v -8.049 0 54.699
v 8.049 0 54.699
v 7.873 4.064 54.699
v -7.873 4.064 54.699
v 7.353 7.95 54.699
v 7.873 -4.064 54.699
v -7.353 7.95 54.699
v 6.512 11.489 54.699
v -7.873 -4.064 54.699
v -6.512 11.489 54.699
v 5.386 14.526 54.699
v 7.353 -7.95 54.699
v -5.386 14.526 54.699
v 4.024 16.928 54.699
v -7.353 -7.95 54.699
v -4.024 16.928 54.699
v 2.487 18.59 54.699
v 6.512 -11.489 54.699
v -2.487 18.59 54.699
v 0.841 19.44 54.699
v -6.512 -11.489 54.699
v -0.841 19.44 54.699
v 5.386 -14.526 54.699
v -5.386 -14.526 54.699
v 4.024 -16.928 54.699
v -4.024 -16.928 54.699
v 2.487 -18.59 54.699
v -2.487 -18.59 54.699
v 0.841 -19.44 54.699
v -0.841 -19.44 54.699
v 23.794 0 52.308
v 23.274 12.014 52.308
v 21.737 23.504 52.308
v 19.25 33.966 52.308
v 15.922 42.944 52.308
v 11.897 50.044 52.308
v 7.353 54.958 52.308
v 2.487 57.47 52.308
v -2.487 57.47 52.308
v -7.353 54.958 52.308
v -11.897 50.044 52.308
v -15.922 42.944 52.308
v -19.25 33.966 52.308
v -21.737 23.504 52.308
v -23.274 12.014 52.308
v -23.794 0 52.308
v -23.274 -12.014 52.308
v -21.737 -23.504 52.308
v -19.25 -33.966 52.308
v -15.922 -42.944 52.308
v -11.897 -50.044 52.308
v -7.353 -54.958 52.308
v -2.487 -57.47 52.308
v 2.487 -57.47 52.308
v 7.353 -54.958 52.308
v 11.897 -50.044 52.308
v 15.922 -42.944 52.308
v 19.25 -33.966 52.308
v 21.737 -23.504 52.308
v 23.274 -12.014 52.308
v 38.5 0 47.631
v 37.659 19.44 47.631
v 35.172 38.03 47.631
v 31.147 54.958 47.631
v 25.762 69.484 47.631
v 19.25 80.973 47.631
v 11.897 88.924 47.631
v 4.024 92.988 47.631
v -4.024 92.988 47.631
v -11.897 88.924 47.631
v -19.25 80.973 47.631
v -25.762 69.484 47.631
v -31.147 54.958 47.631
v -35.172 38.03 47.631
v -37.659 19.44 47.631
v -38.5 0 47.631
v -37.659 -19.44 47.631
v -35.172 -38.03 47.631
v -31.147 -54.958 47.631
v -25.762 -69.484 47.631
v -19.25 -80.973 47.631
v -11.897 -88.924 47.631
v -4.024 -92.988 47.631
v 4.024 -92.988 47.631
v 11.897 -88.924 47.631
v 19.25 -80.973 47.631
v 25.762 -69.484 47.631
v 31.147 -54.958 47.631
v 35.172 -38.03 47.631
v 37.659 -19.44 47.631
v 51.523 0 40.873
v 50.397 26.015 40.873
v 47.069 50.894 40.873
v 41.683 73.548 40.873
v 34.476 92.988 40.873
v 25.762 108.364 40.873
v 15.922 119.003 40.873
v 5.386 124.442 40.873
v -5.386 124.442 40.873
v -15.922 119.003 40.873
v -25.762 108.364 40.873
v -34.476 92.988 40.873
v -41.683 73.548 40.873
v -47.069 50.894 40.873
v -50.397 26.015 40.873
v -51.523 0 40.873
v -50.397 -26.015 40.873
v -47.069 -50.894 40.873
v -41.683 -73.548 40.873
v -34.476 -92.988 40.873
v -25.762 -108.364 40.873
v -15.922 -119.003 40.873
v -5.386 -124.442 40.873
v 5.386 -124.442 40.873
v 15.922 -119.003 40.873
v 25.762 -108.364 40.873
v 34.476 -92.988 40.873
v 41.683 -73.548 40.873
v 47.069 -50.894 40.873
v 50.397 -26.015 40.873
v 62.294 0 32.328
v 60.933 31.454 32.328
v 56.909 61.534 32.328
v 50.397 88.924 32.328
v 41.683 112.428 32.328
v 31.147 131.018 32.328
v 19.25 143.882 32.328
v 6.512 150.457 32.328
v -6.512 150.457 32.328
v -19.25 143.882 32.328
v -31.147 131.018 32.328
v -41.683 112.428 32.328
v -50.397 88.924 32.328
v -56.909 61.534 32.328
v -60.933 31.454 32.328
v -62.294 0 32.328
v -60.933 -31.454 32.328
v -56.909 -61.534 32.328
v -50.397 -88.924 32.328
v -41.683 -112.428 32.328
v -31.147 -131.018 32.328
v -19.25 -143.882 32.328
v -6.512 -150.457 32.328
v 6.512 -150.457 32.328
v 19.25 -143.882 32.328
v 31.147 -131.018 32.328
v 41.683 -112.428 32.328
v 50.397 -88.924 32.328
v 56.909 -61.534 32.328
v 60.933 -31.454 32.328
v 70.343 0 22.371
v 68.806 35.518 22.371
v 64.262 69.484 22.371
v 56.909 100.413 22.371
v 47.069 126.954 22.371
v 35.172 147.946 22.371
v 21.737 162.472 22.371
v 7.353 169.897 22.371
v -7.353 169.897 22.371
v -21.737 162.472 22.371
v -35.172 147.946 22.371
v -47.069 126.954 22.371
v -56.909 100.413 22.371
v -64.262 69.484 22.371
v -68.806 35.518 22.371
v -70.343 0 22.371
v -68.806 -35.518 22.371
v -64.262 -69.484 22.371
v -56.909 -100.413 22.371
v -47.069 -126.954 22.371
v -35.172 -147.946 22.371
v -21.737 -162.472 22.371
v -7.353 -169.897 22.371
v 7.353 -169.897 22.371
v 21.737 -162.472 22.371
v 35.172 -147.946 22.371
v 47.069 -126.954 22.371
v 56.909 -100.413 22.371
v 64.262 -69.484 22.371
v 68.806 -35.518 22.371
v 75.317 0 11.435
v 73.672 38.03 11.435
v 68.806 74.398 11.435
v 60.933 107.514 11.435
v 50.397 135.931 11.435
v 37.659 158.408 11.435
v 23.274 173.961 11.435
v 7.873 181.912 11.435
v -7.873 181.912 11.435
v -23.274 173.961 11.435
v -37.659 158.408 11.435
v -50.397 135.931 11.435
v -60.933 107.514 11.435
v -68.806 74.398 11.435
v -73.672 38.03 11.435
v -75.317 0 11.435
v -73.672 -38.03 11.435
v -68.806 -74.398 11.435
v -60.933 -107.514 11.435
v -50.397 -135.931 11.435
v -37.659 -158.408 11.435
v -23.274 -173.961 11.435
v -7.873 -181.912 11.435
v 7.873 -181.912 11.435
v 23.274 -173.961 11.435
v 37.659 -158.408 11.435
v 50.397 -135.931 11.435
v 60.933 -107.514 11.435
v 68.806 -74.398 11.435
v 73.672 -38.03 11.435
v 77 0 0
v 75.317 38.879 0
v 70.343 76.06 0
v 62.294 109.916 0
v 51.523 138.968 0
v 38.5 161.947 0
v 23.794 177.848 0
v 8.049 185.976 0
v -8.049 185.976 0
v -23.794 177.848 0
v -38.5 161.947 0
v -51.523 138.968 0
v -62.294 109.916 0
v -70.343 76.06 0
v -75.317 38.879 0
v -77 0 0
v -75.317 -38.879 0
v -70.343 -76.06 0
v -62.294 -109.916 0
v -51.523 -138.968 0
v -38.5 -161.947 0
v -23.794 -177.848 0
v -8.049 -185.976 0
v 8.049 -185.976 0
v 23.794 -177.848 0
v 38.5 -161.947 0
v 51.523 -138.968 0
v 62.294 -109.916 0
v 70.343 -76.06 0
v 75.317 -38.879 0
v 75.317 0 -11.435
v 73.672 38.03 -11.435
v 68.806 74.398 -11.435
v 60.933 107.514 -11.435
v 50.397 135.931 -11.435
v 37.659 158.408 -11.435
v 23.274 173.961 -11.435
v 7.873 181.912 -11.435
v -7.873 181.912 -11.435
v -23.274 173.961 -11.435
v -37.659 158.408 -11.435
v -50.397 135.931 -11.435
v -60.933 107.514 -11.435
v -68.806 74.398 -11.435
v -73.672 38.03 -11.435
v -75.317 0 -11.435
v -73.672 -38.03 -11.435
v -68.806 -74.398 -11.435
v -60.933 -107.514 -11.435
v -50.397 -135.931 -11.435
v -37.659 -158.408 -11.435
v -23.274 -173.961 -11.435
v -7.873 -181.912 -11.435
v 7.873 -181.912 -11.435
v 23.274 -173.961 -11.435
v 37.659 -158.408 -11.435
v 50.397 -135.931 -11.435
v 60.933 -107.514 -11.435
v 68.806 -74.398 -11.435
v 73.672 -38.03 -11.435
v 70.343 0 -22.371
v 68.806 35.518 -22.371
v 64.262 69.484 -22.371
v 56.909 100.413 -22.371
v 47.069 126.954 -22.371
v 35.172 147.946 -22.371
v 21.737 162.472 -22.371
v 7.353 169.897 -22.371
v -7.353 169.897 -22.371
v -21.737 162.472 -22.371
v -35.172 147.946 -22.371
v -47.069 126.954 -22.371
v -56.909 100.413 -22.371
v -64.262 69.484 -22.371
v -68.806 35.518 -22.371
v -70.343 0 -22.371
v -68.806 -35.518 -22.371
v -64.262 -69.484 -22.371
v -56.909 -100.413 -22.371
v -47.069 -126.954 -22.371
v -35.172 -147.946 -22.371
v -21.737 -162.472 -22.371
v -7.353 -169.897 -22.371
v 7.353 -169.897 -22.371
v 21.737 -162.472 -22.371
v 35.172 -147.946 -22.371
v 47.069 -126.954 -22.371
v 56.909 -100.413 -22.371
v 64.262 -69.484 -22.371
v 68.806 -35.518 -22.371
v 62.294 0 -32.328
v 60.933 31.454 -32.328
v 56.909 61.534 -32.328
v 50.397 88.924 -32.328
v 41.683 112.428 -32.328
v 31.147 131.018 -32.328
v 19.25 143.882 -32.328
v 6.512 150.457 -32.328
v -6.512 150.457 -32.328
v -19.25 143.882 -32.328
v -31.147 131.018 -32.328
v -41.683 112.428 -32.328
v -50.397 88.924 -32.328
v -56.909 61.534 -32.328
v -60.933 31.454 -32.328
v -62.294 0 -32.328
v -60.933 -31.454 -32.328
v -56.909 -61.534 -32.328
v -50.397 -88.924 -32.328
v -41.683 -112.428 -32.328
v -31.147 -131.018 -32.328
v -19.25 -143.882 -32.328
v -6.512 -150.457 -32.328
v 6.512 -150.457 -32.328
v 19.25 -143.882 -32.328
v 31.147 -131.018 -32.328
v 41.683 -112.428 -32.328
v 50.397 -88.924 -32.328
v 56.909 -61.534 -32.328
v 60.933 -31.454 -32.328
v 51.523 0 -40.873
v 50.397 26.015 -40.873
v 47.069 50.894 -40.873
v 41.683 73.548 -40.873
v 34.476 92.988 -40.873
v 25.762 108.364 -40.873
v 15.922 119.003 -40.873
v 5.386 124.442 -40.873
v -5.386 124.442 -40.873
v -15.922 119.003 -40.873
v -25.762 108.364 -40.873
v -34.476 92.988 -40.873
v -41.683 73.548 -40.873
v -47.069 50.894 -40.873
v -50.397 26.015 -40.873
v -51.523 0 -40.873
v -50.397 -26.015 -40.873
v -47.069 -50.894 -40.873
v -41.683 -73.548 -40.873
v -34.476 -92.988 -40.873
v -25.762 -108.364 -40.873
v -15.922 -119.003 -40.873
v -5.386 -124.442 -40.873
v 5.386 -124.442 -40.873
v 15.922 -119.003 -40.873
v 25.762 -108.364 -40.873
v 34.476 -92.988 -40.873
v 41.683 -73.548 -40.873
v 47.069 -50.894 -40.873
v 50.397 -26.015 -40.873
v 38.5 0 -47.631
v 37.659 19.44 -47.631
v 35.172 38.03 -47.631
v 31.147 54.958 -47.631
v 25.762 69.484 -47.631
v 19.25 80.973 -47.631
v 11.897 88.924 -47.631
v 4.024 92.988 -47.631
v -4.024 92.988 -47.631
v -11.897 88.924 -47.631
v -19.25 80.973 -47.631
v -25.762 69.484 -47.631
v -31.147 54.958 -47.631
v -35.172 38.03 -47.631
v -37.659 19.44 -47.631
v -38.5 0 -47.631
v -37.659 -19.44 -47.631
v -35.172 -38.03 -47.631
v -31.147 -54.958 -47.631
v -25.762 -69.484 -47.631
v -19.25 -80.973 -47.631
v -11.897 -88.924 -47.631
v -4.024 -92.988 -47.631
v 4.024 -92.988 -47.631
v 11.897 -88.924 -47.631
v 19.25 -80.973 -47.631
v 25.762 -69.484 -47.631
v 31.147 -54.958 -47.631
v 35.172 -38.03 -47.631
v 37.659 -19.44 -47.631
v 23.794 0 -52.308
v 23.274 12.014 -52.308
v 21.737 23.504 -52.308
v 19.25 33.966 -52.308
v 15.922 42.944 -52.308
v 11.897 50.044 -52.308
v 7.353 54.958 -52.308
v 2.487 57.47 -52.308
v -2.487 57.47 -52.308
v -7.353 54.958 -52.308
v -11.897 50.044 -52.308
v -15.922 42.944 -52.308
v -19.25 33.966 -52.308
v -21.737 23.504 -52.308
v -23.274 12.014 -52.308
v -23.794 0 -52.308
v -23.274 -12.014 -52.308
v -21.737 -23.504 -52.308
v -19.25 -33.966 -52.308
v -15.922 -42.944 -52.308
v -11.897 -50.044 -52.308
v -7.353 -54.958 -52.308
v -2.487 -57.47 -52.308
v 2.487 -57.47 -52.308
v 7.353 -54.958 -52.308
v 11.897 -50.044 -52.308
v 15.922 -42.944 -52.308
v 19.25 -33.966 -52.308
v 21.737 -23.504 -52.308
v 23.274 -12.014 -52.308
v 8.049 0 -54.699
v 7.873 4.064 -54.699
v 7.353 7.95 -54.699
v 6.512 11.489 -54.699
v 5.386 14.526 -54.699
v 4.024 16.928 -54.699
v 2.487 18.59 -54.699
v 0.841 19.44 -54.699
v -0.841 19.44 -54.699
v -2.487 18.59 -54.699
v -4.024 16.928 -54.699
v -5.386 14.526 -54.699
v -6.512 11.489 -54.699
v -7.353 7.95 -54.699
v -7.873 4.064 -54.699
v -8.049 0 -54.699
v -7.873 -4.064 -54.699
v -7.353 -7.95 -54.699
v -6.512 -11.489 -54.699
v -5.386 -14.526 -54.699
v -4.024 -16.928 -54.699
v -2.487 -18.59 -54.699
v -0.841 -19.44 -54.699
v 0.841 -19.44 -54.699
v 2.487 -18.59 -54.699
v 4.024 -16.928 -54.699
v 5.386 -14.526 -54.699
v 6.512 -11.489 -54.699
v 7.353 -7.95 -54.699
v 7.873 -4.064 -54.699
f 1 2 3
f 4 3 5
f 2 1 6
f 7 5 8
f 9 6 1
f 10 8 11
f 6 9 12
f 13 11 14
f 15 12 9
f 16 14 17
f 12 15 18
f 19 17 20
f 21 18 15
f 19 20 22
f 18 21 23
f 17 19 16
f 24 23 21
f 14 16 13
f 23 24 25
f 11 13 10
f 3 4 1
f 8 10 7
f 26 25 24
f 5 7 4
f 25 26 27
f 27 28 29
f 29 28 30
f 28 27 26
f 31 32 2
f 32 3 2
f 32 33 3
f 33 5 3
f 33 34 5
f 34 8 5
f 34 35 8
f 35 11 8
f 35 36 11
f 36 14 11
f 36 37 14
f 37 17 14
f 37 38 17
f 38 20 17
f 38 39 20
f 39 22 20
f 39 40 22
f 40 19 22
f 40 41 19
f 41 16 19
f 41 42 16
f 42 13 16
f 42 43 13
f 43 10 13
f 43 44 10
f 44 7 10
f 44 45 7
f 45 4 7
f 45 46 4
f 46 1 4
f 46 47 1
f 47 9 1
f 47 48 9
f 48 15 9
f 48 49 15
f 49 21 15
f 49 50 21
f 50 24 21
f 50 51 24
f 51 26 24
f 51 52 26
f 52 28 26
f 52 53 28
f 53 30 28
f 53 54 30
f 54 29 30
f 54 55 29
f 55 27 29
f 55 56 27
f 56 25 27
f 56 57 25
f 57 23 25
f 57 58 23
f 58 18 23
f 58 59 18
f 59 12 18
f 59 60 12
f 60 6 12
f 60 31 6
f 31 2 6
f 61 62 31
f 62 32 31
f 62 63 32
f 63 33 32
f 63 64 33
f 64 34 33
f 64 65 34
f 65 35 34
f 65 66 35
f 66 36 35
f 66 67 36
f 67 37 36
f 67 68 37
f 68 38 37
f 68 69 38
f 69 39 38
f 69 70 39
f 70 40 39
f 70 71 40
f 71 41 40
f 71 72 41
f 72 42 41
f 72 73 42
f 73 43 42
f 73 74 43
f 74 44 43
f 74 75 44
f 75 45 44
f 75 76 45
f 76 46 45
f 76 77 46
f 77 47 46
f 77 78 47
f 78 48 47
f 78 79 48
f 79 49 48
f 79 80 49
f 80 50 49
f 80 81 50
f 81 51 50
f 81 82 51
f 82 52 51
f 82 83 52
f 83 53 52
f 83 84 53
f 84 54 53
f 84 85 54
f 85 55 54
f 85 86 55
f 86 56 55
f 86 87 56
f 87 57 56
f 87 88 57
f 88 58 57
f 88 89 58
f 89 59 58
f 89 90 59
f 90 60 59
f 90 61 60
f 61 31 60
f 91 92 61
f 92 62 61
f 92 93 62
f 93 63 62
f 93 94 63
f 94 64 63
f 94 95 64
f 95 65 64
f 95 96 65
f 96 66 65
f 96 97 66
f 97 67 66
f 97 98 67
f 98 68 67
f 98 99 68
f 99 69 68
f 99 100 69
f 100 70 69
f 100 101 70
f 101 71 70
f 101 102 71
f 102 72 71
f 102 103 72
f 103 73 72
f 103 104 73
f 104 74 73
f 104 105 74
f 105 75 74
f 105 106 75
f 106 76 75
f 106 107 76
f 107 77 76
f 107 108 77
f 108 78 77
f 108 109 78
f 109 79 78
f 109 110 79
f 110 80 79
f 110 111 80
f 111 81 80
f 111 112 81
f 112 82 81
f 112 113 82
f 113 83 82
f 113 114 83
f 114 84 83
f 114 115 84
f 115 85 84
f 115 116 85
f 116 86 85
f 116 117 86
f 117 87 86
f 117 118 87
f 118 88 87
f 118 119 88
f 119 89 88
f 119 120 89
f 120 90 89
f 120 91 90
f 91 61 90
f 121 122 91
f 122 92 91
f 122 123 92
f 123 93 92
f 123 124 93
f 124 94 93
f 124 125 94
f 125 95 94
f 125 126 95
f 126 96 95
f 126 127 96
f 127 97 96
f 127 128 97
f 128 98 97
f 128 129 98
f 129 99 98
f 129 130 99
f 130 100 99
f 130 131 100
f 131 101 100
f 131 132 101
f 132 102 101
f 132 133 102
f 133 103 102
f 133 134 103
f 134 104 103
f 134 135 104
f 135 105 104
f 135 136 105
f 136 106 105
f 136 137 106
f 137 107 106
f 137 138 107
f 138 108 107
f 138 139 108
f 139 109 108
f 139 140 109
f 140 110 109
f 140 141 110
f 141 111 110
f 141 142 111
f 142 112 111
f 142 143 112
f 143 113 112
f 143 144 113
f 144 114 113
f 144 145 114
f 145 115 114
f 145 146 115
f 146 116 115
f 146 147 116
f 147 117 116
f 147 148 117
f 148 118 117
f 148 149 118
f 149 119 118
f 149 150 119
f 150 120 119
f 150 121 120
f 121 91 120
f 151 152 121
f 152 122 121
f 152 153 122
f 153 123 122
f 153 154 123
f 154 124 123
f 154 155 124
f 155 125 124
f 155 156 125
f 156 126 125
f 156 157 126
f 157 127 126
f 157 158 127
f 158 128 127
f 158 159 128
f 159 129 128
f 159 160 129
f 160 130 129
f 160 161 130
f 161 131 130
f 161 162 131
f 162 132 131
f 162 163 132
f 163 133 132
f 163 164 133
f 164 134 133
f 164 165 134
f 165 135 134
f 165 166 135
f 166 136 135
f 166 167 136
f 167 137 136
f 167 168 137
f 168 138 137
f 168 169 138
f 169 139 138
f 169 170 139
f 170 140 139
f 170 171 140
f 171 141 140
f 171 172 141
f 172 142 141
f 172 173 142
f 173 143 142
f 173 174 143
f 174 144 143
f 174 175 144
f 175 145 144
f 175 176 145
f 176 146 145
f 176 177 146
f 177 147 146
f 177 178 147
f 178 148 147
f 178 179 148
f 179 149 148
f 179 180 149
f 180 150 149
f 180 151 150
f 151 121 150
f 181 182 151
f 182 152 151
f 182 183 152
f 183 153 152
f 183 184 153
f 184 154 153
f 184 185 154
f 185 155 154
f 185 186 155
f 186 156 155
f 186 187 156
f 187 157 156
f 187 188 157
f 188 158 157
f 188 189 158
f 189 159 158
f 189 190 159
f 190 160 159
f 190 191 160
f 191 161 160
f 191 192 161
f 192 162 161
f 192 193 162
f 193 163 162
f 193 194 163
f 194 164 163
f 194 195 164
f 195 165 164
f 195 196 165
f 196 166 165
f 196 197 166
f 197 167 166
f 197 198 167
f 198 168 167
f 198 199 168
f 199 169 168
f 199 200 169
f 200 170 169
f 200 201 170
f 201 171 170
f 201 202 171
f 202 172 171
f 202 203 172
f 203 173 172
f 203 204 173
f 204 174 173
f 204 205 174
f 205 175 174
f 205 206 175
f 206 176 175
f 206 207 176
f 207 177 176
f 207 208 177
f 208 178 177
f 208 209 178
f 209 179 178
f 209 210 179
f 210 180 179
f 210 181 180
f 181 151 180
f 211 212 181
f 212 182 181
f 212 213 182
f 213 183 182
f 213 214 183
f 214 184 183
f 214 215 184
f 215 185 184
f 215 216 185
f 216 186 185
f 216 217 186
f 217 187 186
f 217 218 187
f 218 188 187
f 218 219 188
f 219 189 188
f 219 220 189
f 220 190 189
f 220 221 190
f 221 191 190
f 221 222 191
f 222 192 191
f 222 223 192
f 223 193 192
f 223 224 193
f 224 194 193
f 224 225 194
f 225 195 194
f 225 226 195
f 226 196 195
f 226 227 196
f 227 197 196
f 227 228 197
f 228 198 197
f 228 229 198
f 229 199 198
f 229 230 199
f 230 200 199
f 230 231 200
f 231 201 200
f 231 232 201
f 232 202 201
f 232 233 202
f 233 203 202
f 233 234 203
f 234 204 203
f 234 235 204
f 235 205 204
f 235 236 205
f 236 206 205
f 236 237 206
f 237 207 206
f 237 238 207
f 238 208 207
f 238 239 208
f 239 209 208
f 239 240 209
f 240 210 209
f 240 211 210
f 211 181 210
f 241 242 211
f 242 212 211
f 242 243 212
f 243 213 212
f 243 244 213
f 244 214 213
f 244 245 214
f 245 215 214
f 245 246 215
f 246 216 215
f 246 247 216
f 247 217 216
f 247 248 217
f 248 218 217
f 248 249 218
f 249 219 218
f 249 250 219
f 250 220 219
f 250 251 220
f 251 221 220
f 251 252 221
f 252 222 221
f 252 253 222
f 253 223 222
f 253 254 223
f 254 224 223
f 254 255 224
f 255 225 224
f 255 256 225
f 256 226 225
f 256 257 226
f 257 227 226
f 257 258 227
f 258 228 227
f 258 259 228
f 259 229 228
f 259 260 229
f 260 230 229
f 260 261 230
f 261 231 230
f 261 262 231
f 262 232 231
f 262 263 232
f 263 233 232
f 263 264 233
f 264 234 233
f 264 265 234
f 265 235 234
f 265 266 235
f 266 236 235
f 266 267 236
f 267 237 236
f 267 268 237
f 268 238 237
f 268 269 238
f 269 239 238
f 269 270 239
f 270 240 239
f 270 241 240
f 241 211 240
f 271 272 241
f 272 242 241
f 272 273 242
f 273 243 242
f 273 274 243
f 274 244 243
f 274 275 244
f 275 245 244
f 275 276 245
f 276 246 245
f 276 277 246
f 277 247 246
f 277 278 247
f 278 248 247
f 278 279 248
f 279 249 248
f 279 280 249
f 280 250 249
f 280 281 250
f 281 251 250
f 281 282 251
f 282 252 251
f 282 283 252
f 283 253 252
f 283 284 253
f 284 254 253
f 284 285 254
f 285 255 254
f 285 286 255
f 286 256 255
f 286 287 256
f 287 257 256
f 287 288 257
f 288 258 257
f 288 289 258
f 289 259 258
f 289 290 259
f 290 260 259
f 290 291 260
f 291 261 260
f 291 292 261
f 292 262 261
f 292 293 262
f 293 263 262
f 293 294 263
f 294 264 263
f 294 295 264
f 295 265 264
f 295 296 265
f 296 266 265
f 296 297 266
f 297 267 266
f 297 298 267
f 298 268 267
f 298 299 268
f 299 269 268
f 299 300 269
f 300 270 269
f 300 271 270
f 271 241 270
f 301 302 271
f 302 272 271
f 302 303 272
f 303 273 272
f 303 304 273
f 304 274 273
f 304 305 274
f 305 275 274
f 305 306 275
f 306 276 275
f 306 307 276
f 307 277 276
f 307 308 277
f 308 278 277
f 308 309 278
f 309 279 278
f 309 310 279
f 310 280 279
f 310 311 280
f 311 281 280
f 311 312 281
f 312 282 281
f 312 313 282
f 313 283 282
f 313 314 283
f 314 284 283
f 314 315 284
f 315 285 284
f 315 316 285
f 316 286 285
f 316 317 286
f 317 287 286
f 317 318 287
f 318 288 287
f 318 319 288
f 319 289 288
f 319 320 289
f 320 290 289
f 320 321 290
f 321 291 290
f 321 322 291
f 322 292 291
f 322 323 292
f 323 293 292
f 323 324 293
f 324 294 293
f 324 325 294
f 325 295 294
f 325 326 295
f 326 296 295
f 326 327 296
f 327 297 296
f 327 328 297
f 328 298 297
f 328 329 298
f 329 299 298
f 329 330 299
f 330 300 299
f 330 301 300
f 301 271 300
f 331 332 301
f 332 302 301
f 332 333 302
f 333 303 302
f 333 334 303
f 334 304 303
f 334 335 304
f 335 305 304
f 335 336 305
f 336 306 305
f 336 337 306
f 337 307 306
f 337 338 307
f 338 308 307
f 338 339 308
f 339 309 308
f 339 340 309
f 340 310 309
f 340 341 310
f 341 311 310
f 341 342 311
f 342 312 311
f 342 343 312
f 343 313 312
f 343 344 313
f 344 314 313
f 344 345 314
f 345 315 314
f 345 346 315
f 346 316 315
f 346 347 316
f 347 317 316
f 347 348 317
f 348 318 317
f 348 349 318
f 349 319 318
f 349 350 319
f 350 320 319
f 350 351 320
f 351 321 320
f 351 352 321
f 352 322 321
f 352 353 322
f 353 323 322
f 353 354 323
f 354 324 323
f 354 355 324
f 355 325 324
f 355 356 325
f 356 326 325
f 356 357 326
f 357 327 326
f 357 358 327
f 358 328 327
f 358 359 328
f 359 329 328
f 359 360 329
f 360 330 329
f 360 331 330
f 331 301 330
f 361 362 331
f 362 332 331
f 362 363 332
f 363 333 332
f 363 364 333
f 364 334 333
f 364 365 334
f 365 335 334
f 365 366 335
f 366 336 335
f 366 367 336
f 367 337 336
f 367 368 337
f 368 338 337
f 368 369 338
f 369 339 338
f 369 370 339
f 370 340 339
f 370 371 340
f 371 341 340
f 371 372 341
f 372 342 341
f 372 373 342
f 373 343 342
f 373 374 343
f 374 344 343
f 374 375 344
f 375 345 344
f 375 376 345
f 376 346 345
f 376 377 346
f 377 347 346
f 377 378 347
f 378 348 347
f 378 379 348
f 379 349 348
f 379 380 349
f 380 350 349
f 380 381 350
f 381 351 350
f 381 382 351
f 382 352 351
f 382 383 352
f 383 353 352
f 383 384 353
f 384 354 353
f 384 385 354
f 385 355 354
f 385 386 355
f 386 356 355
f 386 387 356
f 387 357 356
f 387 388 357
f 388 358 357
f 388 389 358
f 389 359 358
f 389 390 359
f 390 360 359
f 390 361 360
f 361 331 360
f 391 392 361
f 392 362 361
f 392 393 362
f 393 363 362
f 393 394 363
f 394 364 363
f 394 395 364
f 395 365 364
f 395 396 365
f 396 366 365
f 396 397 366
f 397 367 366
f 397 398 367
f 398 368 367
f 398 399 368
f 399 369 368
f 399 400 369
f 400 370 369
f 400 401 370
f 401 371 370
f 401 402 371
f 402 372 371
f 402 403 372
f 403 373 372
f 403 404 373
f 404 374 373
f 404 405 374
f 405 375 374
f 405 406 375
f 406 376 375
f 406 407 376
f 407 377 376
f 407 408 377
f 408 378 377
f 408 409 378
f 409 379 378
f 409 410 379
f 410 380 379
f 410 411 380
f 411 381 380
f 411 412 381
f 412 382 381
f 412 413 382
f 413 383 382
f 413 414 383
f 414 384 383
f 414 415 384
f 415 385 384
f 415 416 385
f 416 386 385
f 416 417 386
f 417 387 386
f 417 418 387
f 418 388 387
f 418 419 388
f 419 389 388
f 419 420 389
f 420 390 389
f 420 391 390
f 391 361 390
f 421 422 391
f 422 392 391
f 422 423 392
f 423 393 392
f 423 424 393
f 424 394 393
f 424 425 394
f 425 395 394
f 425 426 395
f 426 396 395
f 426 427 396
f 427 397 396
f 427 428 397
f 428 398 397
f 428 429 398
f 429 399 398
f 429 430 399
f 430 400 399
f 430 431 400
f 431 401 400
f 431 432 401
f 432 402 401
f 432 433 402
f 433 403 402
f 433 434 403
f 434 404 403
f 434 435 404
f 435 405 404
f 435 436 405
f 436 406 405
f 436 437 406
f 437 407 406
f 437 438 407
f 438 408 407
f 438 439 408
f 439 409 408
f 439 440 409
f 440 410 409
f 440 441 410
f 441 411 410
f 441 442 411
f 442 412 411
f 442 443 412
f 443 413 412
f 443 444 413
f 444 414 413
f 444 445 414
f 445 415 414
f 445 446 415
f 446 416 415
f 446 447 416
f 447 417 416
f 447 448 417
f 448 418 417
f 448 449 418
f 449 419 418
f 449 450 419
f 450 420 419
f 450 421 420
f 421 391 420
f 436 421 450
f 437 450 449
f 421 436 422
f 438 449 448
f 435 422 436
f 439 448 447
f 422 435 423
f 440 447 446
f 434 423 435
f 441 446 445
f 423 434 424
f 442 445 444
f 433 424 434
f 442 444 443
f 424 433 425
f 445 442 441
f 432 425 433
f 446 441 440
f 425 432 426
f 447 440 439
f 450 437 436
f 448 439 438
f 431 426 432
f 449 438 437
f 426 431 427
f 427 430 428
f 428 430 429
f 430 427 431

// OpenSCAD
// Generated by SolidPython 1.0.1 on 2020-07-29 00:46:48


scale(v = [7, 17, 5]) {
	sphere(r = 11);
}
/***********************************************
*********      SolidPython code:      **********
************************************************
 
# import packages: SolidPython
from solid import *
from solid.utils import *
from itertools import chain, combinations, permutations


class Resize:

    def __init__(self, scad_file):
        self.scad_file = scad_file
        #self.scad_file = import_scad(scad_file)
        # cone/cylinder param:
        self.r1 = 0
        self.r2 = 0
        self.h = 0
        # rectangular prism param:
        self.w = 0
        self.l = 0
        # ellipse param:
        self.r = 0

    # import OpenScad code (file name corresponds to shape)


    # classify shape + parameters
    def assign(self, param1, param2, param3):
        if self.scad_file == 'cone.scad':
            self.r1 = param1
            self.r2 = param2
            self.h = param3
        elif self.scad_file == 'cylinder.scad':
            self.r1 = param1
            self.r2 = param2
            self.h = param3
        elif self.scad_file == 'rectangularPrism.scad':
            self.h = param1
            self.l = param2
            self.w = param3
        else:
            self.r = param1
            self.h = param2

    # resize parameters
    def iterate(self):
        x = range(3, 20, 2)
        i = 1
        if self.scad_file == 'cone.scad':
            tempList = list(permutations(x, 2))
            for temp in tempList:
                param1 = temp[0]
                param2 = temp[1]
                filepath = 'produced_scad_files/' + 'cone' + str(param1) + '_' + str(param2) + '_' + '.scad'
                scad_render_to_file(cylinder(h=param1, r1=param2, r2=0), filepath)

        elif self.scad_file == 'cylinder.scad':
            tempList = list(permutations(x, 3))
            for temp in tempList:
                param1 = temp[0]
                param2 = temp[1]
                filepath = 'produced_scad_files/' + 'cylinder' + str(param1) + '_' + str(param2) + '_' + '.scad'
                scad_render_to_file(cylinder(h=param1, r1=param2, r2=param2), filepath)

        elif self.scad_file == 'rectangularPrism.scad':
            tempList = list(permutations(x, 3))
            for temp in tempList:
                param1 = temp[0]
                param2 = temp[1]
                param3 = temp[2]
                filepath = 'produced_scad_files/' + 'rectangularPrism' + str(param1) + '_' + str(param2) + '_' + str(
                    param3) + '.scad'
                scad_render_to_file(cube(size=(param1, param2, param3)), filepath)

        elif self.scad_file == 'ellipse.scad':
            tempList = list(permutations(x, 4))
            for temp in tempList:
                param1 = temp[0]
                param2 = temp[1]
                param3 = temp[2]
                param4 = temp[3]
                filepath = 'produced_scad_files/' + 'ellipse' + str(param1) + '_' + str(param2) + '_' + str(param3) + '_' + str(param4) + '.scad'
                scad_render_to_file(scale([param1, param2, param3])(sphere(r=param4)), filepath)

    def render_to_scadfile(self):
        scad_render_to_file(scad, 'example.scad') 
 
************************************************/
